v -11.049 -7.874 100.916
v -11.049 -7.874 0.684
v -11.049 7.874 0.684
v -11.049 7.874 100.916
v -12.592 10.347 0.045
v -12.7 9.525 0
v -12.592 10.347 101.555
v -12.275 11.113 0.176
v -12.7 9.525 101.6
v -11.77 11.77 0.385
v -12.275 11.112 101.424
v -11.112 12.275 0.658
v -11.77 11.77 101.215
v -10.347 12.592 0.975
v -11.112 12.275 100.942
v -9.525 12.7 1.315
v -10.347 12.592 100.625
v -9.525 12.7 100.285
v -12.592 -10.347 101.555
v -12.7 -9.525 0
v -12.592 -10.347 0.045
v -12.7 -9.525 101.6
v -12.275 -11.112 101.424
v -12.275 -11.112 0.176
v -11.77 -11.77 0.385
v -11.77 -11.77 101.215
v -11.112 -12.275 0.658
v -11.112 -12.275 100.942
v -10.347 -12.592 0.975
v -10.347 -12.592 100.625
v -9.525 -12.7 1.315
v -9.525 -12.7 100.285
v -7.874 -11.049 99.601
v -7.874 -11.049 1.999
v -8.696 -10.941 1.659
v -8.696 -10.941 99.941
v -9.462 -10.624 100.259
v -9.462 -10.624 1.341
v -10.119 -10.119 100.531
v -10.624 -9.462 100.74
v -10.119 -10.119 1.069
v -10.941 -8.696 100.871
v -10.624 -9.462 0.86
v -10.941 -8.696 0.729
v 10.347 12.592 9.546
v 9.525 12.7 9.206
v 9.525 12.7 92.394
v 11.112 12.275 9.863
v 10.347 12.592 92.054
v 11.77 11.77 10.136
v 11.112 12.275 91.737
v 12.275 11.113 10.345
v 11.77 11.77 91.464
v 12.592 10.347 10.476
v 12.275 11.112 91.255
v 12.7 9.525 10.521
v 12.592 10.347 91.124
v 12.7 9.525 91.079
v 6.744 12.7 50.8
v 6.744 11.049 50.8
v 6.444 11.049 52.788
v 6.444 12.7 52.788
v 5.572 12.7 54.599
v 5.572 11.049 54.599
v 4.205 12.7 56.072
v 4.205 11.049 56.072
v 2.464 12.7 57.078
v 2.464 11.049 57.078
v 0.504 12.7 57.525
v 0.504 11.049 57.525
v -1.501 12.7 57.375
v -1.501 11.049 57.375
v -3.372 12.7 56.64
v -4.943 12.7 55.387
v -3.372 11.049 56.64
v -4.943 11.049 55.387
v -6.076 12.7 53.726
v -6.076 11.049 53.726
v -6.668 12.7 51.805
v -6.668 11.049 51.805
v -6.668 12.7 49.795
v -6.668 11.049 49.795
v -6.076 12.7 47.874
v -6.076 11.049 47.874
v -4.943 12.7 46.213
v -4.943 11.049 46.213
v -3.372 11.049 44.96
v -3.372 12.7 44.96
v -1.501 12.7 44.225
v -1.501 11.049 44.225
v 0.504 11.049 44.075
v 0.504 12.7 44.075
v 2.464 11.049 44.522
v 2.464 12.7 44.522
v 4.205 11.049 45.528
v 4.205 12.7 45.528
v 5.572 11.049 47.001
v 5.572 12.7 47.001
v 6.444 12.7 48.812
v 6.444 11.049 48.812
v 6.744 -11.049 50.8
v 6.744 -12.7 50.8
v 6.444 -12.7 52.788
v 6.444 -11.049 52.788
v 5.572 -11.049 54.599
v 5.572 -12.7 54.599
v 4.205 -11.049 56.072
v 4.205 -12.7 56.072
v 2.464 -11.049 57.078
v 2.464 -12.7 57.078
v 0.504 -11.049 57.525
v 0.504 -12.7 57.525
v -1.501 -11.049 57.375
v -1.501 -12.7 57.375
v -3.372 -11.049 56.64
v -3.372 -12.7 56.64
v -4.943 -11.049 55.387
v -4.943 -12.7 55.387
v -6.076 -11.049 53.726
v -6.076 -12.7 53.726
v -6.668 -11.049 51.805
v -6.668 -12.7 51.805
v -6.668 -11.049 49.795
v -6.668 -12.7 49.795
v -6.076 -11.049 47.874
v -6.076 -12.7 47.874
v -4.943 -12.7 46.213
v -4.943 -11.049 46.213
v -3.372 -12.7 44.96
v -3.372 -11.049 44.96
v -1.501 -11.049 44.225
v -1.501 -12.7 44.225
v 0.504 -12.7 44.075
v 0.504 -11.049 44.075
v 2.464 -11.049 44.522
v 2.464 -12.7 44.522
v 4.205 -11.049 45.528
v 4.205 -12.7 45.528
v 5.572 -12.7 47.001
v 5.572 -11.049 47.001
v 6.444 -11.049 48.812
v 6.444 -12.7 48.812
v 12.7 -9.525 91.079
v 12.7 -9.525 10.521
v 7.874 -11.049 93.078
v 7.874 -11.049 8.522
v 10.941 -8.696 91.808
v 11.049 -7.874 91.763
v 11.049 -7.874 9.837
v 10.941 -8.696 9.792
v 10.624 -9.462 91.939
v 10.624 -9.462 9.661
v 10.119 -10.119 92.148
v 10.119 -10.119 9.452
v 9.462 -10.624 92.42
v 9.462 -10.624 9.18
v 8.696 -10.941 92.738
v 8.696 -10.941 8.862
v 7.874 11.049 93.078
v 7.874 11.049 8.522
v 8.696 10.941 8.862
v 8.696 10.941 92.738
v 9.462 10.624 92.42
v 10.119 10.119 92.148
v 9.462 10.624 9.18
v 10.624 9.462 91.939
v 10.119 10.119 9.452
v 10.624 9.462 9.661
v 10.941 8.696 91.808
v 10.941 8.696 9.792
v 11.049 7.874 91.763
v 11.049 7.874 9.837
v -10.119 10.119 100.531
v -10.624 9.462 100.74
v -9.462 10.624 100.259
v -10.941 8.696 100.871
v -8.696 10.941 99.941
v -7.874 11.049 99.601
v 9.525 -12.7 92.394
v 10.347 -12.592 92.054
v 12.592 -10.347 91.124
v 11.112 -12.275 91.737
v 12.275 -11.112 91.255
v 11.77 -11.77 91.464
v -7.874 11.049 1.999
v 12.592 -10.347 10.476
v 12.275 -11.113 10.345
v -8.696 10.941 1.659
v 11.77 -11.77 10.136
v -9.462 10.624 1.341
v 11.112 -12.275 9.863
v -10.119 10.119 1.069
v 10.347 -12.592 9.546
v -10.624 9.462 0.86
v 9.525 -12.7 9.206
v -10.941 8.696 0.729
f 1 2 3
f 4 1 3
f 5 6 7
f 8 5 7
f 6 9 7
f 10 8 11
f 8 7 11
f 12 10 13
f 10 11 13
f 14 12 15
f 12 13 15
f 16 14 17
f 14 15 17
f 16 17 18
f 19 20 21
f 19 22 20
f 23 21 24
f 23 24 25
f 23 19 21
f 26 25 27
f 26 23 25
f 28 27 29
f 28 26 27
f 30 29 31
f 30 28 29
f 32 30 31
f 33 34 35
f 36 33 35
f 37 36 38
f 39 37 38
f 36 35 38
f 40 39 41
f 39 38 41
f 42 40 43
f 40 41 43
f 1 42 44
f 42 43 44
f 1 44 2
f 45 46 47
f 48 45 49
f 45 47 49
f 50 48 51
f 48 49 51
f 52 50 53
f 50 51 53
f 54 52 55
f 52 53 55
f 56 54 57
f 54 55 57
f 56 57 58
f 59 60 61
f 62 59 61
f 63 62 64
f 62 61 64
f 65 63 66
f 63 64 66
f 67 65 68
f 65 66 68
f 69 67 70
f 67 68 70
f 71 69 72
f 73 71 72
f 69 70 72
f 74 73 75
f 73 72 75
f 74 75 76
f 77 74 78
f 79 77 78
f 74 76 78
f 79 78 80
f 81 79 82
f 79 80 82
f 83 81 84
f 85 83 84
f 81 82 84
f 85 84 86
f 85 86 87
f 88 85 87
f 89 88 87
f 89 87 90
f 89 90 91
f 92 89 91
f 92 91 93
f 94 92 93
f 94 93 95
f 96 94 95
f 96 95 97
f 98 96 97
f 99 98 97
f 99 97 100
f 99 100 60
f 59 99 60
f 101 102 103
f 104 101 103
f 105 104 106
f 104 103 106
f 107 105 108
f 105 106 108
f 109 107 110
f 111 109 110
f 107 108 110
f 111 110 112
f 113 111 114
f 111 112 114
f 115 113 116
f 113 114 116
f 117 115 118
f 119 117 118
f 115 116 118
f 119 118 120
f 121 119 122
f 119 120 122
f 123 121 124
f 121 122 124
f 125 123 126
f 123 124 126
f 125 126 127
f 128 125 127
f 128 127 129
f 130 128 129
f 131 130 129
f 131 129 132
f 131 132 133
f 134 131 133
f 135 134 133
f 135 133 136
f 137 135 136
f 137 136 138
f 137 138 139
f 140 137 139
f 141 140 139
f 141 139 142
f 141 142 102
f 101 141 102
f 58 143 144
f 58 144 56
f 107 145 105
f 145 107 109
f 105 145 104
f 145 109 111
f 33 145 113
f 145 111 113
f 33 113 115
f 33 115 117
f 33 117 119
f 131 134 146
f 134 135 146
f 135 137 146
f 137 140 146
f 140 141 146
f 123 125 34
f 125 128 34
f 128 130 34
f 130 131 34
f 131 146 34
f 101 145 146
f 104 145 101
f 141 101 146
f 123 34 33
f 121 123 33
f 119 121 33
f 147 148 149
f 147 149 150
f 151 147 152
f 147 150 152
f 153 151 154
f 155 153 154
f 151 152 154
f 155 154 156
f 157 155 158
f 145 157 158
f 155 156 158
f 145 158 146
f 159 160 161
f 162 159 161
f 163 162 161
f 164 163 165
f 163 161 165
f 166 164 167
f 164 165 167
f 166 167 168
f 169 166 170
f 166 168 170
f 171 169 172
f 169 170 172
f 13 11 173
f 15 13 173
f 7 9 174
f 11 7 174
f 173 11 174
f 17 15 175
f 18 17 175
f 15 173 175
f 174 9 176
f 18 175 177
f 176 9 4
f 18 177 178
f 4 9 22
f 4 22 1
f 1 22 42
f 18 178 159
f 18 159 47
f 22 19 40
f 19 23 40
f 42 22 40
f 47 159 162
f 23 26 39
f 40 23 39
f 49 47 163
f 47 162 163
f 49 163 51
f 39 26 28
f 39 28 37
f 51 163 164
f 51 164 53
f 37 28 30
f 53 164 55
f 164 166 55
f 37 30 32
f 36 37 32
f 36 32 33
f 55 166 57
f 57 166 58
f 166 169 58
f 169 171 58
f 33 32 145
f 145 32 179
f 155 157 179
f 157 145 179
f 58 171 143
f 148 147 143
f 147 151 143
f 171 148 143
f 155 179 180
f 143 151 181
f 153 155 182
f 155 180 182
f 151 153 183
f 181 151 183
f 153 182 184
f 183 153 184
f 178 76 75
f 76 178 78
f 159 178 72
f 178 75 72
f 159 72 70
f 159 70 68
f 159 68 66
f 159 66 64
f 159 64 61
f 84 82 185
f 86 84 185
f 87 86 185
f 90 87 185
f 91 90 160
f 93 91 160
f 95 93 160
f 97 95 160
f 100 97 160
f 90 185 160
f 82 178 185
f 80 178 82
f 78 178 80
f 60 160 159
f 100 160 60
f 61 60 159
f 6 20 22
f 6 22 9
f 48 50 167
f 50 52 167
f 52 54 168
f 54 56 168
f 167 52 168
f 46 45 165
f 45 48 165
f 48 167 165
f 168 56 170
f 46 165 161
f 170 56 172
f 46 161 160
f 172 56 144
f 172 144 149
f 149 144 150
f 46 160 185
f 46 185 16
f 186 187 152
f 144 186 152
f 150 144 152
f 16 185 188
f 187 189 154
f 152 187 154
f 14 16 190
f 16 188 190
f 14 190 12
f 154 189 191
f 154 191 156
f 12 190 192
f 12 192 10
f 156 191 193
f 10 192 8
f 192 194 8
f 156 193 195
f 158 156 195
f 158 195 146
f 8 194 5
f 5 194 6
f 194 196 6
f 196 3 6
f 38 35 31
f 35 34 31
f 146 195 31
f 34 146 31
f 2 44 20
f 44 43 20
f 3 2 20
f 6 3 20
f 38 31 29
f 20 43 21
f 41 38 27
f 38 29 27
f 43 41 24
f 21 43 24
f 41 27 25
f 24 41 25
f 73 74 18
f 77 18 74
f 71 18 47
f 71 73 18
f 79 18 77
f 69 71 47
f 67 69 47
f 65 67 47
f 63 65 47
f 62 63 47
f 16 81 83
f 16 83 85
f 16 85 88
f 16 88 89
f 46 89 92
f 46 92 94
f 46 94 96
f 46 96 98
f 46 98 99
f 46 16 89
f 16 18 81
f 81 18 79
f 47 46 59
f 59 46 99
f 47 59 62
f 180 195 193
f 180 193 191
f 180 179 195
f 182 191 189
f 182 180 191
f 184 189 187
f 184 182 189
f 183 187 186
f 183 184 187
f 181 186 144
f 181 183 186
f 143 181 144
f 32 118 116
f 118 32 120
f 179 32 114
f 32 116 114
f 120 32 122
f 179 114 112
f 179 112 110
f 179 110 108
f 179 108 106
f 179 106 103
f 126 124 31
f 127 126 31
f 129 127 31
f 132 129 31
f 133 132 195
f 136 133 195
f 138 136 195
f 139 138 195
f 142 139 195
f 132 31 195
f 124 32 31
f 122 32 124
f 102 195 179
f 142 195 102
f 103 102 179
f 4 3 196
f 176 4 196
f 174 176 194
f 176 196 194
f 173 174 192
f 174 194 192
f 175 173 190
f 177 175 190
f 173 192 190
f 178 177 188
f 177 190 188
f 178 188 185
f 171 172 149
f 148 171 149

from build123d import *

# Parameters (mm, degrees)
F1_W     = 25.4
F1_H     = 25.4
F2_DEPTH = 101.6
F4_DEPTH = 25.4
F5_R     = 3.175
F6_R     = 6.7437
F7_DEPTH = 25.401


# Not quite as in the source:
# - a variable given as a bare number and used for a length is read in inches; the dataset says mm whatever the document's units were


with BuildPart() as f2:
    # F1 (on Top) → F2 (new body)
    with BuildSketch(Plane.XY):
        Rectangle(F1_W, F1_H)
        with BuildLine():
            ThreePointArc((-11.049, 7.874), (-10.1190640303, 10.1190640303), (-7.874, 11.049))
            Line((-7.874, 11.049), (7.874, 11.049))
            ThreePointArc((7.874, 11.049), (10.1190640303, 10.1190640303), (11.049, 7.874))
            Line((11.049, 7.874), (11.049, -7.874))
            ThreePointArc((11.049, -7.874), (10.1190640303, -10.1190640303), (7.874, -11.049))
            Line((7.874, -11.049), (-7.874, -11.049))
            ThreePointArc((-7.874, -11.049), (-10.1190640303, -10.1190640303), (-11.049, -7.874))
            Line((-11.049, -7.874), (-11.049, 7.874))
        make_face(mode=Mode.SUBTRACT)
    extrude(amount=F2_DEPTH)

    # F3 (on face) → F4 (cut)
    with BuildSketch(Plane.XZ.offset(12.7)):
        Polygon((12.7, 10.5210244843), (-12.7, 0), (12.7, 0), align=None)
        Polygon((12.7, 101.6), (-12.7, 101.6), (12.7, 91.0789755157), align=None)
    extrude(amount=-F4_DEPTH, mode=Mode.SUBTRACT)

    # F5
    f5_edges = [f2.edges().sort_by_distance(p)[0] for p in [
        (-12.7, 12.7, 50.8),
        (12.7, 12.7, 50.8),
        (-12.7, -12.7, 50.8),
        (12.7, -12.7, 50.8),
    ]]
    fillet(f5_edges, radius=F5_R)

    # F6 (on face) → F7 (cut, through all)
    with BuildSketch(Plane.XZ.offset(12.7)):
        with Locations((0, 50.8)):
            Circle(F6_R)
    extrude(amount=-F7_DEPTH, mode=Mode.SUBTRACT)


solid = f2.part
